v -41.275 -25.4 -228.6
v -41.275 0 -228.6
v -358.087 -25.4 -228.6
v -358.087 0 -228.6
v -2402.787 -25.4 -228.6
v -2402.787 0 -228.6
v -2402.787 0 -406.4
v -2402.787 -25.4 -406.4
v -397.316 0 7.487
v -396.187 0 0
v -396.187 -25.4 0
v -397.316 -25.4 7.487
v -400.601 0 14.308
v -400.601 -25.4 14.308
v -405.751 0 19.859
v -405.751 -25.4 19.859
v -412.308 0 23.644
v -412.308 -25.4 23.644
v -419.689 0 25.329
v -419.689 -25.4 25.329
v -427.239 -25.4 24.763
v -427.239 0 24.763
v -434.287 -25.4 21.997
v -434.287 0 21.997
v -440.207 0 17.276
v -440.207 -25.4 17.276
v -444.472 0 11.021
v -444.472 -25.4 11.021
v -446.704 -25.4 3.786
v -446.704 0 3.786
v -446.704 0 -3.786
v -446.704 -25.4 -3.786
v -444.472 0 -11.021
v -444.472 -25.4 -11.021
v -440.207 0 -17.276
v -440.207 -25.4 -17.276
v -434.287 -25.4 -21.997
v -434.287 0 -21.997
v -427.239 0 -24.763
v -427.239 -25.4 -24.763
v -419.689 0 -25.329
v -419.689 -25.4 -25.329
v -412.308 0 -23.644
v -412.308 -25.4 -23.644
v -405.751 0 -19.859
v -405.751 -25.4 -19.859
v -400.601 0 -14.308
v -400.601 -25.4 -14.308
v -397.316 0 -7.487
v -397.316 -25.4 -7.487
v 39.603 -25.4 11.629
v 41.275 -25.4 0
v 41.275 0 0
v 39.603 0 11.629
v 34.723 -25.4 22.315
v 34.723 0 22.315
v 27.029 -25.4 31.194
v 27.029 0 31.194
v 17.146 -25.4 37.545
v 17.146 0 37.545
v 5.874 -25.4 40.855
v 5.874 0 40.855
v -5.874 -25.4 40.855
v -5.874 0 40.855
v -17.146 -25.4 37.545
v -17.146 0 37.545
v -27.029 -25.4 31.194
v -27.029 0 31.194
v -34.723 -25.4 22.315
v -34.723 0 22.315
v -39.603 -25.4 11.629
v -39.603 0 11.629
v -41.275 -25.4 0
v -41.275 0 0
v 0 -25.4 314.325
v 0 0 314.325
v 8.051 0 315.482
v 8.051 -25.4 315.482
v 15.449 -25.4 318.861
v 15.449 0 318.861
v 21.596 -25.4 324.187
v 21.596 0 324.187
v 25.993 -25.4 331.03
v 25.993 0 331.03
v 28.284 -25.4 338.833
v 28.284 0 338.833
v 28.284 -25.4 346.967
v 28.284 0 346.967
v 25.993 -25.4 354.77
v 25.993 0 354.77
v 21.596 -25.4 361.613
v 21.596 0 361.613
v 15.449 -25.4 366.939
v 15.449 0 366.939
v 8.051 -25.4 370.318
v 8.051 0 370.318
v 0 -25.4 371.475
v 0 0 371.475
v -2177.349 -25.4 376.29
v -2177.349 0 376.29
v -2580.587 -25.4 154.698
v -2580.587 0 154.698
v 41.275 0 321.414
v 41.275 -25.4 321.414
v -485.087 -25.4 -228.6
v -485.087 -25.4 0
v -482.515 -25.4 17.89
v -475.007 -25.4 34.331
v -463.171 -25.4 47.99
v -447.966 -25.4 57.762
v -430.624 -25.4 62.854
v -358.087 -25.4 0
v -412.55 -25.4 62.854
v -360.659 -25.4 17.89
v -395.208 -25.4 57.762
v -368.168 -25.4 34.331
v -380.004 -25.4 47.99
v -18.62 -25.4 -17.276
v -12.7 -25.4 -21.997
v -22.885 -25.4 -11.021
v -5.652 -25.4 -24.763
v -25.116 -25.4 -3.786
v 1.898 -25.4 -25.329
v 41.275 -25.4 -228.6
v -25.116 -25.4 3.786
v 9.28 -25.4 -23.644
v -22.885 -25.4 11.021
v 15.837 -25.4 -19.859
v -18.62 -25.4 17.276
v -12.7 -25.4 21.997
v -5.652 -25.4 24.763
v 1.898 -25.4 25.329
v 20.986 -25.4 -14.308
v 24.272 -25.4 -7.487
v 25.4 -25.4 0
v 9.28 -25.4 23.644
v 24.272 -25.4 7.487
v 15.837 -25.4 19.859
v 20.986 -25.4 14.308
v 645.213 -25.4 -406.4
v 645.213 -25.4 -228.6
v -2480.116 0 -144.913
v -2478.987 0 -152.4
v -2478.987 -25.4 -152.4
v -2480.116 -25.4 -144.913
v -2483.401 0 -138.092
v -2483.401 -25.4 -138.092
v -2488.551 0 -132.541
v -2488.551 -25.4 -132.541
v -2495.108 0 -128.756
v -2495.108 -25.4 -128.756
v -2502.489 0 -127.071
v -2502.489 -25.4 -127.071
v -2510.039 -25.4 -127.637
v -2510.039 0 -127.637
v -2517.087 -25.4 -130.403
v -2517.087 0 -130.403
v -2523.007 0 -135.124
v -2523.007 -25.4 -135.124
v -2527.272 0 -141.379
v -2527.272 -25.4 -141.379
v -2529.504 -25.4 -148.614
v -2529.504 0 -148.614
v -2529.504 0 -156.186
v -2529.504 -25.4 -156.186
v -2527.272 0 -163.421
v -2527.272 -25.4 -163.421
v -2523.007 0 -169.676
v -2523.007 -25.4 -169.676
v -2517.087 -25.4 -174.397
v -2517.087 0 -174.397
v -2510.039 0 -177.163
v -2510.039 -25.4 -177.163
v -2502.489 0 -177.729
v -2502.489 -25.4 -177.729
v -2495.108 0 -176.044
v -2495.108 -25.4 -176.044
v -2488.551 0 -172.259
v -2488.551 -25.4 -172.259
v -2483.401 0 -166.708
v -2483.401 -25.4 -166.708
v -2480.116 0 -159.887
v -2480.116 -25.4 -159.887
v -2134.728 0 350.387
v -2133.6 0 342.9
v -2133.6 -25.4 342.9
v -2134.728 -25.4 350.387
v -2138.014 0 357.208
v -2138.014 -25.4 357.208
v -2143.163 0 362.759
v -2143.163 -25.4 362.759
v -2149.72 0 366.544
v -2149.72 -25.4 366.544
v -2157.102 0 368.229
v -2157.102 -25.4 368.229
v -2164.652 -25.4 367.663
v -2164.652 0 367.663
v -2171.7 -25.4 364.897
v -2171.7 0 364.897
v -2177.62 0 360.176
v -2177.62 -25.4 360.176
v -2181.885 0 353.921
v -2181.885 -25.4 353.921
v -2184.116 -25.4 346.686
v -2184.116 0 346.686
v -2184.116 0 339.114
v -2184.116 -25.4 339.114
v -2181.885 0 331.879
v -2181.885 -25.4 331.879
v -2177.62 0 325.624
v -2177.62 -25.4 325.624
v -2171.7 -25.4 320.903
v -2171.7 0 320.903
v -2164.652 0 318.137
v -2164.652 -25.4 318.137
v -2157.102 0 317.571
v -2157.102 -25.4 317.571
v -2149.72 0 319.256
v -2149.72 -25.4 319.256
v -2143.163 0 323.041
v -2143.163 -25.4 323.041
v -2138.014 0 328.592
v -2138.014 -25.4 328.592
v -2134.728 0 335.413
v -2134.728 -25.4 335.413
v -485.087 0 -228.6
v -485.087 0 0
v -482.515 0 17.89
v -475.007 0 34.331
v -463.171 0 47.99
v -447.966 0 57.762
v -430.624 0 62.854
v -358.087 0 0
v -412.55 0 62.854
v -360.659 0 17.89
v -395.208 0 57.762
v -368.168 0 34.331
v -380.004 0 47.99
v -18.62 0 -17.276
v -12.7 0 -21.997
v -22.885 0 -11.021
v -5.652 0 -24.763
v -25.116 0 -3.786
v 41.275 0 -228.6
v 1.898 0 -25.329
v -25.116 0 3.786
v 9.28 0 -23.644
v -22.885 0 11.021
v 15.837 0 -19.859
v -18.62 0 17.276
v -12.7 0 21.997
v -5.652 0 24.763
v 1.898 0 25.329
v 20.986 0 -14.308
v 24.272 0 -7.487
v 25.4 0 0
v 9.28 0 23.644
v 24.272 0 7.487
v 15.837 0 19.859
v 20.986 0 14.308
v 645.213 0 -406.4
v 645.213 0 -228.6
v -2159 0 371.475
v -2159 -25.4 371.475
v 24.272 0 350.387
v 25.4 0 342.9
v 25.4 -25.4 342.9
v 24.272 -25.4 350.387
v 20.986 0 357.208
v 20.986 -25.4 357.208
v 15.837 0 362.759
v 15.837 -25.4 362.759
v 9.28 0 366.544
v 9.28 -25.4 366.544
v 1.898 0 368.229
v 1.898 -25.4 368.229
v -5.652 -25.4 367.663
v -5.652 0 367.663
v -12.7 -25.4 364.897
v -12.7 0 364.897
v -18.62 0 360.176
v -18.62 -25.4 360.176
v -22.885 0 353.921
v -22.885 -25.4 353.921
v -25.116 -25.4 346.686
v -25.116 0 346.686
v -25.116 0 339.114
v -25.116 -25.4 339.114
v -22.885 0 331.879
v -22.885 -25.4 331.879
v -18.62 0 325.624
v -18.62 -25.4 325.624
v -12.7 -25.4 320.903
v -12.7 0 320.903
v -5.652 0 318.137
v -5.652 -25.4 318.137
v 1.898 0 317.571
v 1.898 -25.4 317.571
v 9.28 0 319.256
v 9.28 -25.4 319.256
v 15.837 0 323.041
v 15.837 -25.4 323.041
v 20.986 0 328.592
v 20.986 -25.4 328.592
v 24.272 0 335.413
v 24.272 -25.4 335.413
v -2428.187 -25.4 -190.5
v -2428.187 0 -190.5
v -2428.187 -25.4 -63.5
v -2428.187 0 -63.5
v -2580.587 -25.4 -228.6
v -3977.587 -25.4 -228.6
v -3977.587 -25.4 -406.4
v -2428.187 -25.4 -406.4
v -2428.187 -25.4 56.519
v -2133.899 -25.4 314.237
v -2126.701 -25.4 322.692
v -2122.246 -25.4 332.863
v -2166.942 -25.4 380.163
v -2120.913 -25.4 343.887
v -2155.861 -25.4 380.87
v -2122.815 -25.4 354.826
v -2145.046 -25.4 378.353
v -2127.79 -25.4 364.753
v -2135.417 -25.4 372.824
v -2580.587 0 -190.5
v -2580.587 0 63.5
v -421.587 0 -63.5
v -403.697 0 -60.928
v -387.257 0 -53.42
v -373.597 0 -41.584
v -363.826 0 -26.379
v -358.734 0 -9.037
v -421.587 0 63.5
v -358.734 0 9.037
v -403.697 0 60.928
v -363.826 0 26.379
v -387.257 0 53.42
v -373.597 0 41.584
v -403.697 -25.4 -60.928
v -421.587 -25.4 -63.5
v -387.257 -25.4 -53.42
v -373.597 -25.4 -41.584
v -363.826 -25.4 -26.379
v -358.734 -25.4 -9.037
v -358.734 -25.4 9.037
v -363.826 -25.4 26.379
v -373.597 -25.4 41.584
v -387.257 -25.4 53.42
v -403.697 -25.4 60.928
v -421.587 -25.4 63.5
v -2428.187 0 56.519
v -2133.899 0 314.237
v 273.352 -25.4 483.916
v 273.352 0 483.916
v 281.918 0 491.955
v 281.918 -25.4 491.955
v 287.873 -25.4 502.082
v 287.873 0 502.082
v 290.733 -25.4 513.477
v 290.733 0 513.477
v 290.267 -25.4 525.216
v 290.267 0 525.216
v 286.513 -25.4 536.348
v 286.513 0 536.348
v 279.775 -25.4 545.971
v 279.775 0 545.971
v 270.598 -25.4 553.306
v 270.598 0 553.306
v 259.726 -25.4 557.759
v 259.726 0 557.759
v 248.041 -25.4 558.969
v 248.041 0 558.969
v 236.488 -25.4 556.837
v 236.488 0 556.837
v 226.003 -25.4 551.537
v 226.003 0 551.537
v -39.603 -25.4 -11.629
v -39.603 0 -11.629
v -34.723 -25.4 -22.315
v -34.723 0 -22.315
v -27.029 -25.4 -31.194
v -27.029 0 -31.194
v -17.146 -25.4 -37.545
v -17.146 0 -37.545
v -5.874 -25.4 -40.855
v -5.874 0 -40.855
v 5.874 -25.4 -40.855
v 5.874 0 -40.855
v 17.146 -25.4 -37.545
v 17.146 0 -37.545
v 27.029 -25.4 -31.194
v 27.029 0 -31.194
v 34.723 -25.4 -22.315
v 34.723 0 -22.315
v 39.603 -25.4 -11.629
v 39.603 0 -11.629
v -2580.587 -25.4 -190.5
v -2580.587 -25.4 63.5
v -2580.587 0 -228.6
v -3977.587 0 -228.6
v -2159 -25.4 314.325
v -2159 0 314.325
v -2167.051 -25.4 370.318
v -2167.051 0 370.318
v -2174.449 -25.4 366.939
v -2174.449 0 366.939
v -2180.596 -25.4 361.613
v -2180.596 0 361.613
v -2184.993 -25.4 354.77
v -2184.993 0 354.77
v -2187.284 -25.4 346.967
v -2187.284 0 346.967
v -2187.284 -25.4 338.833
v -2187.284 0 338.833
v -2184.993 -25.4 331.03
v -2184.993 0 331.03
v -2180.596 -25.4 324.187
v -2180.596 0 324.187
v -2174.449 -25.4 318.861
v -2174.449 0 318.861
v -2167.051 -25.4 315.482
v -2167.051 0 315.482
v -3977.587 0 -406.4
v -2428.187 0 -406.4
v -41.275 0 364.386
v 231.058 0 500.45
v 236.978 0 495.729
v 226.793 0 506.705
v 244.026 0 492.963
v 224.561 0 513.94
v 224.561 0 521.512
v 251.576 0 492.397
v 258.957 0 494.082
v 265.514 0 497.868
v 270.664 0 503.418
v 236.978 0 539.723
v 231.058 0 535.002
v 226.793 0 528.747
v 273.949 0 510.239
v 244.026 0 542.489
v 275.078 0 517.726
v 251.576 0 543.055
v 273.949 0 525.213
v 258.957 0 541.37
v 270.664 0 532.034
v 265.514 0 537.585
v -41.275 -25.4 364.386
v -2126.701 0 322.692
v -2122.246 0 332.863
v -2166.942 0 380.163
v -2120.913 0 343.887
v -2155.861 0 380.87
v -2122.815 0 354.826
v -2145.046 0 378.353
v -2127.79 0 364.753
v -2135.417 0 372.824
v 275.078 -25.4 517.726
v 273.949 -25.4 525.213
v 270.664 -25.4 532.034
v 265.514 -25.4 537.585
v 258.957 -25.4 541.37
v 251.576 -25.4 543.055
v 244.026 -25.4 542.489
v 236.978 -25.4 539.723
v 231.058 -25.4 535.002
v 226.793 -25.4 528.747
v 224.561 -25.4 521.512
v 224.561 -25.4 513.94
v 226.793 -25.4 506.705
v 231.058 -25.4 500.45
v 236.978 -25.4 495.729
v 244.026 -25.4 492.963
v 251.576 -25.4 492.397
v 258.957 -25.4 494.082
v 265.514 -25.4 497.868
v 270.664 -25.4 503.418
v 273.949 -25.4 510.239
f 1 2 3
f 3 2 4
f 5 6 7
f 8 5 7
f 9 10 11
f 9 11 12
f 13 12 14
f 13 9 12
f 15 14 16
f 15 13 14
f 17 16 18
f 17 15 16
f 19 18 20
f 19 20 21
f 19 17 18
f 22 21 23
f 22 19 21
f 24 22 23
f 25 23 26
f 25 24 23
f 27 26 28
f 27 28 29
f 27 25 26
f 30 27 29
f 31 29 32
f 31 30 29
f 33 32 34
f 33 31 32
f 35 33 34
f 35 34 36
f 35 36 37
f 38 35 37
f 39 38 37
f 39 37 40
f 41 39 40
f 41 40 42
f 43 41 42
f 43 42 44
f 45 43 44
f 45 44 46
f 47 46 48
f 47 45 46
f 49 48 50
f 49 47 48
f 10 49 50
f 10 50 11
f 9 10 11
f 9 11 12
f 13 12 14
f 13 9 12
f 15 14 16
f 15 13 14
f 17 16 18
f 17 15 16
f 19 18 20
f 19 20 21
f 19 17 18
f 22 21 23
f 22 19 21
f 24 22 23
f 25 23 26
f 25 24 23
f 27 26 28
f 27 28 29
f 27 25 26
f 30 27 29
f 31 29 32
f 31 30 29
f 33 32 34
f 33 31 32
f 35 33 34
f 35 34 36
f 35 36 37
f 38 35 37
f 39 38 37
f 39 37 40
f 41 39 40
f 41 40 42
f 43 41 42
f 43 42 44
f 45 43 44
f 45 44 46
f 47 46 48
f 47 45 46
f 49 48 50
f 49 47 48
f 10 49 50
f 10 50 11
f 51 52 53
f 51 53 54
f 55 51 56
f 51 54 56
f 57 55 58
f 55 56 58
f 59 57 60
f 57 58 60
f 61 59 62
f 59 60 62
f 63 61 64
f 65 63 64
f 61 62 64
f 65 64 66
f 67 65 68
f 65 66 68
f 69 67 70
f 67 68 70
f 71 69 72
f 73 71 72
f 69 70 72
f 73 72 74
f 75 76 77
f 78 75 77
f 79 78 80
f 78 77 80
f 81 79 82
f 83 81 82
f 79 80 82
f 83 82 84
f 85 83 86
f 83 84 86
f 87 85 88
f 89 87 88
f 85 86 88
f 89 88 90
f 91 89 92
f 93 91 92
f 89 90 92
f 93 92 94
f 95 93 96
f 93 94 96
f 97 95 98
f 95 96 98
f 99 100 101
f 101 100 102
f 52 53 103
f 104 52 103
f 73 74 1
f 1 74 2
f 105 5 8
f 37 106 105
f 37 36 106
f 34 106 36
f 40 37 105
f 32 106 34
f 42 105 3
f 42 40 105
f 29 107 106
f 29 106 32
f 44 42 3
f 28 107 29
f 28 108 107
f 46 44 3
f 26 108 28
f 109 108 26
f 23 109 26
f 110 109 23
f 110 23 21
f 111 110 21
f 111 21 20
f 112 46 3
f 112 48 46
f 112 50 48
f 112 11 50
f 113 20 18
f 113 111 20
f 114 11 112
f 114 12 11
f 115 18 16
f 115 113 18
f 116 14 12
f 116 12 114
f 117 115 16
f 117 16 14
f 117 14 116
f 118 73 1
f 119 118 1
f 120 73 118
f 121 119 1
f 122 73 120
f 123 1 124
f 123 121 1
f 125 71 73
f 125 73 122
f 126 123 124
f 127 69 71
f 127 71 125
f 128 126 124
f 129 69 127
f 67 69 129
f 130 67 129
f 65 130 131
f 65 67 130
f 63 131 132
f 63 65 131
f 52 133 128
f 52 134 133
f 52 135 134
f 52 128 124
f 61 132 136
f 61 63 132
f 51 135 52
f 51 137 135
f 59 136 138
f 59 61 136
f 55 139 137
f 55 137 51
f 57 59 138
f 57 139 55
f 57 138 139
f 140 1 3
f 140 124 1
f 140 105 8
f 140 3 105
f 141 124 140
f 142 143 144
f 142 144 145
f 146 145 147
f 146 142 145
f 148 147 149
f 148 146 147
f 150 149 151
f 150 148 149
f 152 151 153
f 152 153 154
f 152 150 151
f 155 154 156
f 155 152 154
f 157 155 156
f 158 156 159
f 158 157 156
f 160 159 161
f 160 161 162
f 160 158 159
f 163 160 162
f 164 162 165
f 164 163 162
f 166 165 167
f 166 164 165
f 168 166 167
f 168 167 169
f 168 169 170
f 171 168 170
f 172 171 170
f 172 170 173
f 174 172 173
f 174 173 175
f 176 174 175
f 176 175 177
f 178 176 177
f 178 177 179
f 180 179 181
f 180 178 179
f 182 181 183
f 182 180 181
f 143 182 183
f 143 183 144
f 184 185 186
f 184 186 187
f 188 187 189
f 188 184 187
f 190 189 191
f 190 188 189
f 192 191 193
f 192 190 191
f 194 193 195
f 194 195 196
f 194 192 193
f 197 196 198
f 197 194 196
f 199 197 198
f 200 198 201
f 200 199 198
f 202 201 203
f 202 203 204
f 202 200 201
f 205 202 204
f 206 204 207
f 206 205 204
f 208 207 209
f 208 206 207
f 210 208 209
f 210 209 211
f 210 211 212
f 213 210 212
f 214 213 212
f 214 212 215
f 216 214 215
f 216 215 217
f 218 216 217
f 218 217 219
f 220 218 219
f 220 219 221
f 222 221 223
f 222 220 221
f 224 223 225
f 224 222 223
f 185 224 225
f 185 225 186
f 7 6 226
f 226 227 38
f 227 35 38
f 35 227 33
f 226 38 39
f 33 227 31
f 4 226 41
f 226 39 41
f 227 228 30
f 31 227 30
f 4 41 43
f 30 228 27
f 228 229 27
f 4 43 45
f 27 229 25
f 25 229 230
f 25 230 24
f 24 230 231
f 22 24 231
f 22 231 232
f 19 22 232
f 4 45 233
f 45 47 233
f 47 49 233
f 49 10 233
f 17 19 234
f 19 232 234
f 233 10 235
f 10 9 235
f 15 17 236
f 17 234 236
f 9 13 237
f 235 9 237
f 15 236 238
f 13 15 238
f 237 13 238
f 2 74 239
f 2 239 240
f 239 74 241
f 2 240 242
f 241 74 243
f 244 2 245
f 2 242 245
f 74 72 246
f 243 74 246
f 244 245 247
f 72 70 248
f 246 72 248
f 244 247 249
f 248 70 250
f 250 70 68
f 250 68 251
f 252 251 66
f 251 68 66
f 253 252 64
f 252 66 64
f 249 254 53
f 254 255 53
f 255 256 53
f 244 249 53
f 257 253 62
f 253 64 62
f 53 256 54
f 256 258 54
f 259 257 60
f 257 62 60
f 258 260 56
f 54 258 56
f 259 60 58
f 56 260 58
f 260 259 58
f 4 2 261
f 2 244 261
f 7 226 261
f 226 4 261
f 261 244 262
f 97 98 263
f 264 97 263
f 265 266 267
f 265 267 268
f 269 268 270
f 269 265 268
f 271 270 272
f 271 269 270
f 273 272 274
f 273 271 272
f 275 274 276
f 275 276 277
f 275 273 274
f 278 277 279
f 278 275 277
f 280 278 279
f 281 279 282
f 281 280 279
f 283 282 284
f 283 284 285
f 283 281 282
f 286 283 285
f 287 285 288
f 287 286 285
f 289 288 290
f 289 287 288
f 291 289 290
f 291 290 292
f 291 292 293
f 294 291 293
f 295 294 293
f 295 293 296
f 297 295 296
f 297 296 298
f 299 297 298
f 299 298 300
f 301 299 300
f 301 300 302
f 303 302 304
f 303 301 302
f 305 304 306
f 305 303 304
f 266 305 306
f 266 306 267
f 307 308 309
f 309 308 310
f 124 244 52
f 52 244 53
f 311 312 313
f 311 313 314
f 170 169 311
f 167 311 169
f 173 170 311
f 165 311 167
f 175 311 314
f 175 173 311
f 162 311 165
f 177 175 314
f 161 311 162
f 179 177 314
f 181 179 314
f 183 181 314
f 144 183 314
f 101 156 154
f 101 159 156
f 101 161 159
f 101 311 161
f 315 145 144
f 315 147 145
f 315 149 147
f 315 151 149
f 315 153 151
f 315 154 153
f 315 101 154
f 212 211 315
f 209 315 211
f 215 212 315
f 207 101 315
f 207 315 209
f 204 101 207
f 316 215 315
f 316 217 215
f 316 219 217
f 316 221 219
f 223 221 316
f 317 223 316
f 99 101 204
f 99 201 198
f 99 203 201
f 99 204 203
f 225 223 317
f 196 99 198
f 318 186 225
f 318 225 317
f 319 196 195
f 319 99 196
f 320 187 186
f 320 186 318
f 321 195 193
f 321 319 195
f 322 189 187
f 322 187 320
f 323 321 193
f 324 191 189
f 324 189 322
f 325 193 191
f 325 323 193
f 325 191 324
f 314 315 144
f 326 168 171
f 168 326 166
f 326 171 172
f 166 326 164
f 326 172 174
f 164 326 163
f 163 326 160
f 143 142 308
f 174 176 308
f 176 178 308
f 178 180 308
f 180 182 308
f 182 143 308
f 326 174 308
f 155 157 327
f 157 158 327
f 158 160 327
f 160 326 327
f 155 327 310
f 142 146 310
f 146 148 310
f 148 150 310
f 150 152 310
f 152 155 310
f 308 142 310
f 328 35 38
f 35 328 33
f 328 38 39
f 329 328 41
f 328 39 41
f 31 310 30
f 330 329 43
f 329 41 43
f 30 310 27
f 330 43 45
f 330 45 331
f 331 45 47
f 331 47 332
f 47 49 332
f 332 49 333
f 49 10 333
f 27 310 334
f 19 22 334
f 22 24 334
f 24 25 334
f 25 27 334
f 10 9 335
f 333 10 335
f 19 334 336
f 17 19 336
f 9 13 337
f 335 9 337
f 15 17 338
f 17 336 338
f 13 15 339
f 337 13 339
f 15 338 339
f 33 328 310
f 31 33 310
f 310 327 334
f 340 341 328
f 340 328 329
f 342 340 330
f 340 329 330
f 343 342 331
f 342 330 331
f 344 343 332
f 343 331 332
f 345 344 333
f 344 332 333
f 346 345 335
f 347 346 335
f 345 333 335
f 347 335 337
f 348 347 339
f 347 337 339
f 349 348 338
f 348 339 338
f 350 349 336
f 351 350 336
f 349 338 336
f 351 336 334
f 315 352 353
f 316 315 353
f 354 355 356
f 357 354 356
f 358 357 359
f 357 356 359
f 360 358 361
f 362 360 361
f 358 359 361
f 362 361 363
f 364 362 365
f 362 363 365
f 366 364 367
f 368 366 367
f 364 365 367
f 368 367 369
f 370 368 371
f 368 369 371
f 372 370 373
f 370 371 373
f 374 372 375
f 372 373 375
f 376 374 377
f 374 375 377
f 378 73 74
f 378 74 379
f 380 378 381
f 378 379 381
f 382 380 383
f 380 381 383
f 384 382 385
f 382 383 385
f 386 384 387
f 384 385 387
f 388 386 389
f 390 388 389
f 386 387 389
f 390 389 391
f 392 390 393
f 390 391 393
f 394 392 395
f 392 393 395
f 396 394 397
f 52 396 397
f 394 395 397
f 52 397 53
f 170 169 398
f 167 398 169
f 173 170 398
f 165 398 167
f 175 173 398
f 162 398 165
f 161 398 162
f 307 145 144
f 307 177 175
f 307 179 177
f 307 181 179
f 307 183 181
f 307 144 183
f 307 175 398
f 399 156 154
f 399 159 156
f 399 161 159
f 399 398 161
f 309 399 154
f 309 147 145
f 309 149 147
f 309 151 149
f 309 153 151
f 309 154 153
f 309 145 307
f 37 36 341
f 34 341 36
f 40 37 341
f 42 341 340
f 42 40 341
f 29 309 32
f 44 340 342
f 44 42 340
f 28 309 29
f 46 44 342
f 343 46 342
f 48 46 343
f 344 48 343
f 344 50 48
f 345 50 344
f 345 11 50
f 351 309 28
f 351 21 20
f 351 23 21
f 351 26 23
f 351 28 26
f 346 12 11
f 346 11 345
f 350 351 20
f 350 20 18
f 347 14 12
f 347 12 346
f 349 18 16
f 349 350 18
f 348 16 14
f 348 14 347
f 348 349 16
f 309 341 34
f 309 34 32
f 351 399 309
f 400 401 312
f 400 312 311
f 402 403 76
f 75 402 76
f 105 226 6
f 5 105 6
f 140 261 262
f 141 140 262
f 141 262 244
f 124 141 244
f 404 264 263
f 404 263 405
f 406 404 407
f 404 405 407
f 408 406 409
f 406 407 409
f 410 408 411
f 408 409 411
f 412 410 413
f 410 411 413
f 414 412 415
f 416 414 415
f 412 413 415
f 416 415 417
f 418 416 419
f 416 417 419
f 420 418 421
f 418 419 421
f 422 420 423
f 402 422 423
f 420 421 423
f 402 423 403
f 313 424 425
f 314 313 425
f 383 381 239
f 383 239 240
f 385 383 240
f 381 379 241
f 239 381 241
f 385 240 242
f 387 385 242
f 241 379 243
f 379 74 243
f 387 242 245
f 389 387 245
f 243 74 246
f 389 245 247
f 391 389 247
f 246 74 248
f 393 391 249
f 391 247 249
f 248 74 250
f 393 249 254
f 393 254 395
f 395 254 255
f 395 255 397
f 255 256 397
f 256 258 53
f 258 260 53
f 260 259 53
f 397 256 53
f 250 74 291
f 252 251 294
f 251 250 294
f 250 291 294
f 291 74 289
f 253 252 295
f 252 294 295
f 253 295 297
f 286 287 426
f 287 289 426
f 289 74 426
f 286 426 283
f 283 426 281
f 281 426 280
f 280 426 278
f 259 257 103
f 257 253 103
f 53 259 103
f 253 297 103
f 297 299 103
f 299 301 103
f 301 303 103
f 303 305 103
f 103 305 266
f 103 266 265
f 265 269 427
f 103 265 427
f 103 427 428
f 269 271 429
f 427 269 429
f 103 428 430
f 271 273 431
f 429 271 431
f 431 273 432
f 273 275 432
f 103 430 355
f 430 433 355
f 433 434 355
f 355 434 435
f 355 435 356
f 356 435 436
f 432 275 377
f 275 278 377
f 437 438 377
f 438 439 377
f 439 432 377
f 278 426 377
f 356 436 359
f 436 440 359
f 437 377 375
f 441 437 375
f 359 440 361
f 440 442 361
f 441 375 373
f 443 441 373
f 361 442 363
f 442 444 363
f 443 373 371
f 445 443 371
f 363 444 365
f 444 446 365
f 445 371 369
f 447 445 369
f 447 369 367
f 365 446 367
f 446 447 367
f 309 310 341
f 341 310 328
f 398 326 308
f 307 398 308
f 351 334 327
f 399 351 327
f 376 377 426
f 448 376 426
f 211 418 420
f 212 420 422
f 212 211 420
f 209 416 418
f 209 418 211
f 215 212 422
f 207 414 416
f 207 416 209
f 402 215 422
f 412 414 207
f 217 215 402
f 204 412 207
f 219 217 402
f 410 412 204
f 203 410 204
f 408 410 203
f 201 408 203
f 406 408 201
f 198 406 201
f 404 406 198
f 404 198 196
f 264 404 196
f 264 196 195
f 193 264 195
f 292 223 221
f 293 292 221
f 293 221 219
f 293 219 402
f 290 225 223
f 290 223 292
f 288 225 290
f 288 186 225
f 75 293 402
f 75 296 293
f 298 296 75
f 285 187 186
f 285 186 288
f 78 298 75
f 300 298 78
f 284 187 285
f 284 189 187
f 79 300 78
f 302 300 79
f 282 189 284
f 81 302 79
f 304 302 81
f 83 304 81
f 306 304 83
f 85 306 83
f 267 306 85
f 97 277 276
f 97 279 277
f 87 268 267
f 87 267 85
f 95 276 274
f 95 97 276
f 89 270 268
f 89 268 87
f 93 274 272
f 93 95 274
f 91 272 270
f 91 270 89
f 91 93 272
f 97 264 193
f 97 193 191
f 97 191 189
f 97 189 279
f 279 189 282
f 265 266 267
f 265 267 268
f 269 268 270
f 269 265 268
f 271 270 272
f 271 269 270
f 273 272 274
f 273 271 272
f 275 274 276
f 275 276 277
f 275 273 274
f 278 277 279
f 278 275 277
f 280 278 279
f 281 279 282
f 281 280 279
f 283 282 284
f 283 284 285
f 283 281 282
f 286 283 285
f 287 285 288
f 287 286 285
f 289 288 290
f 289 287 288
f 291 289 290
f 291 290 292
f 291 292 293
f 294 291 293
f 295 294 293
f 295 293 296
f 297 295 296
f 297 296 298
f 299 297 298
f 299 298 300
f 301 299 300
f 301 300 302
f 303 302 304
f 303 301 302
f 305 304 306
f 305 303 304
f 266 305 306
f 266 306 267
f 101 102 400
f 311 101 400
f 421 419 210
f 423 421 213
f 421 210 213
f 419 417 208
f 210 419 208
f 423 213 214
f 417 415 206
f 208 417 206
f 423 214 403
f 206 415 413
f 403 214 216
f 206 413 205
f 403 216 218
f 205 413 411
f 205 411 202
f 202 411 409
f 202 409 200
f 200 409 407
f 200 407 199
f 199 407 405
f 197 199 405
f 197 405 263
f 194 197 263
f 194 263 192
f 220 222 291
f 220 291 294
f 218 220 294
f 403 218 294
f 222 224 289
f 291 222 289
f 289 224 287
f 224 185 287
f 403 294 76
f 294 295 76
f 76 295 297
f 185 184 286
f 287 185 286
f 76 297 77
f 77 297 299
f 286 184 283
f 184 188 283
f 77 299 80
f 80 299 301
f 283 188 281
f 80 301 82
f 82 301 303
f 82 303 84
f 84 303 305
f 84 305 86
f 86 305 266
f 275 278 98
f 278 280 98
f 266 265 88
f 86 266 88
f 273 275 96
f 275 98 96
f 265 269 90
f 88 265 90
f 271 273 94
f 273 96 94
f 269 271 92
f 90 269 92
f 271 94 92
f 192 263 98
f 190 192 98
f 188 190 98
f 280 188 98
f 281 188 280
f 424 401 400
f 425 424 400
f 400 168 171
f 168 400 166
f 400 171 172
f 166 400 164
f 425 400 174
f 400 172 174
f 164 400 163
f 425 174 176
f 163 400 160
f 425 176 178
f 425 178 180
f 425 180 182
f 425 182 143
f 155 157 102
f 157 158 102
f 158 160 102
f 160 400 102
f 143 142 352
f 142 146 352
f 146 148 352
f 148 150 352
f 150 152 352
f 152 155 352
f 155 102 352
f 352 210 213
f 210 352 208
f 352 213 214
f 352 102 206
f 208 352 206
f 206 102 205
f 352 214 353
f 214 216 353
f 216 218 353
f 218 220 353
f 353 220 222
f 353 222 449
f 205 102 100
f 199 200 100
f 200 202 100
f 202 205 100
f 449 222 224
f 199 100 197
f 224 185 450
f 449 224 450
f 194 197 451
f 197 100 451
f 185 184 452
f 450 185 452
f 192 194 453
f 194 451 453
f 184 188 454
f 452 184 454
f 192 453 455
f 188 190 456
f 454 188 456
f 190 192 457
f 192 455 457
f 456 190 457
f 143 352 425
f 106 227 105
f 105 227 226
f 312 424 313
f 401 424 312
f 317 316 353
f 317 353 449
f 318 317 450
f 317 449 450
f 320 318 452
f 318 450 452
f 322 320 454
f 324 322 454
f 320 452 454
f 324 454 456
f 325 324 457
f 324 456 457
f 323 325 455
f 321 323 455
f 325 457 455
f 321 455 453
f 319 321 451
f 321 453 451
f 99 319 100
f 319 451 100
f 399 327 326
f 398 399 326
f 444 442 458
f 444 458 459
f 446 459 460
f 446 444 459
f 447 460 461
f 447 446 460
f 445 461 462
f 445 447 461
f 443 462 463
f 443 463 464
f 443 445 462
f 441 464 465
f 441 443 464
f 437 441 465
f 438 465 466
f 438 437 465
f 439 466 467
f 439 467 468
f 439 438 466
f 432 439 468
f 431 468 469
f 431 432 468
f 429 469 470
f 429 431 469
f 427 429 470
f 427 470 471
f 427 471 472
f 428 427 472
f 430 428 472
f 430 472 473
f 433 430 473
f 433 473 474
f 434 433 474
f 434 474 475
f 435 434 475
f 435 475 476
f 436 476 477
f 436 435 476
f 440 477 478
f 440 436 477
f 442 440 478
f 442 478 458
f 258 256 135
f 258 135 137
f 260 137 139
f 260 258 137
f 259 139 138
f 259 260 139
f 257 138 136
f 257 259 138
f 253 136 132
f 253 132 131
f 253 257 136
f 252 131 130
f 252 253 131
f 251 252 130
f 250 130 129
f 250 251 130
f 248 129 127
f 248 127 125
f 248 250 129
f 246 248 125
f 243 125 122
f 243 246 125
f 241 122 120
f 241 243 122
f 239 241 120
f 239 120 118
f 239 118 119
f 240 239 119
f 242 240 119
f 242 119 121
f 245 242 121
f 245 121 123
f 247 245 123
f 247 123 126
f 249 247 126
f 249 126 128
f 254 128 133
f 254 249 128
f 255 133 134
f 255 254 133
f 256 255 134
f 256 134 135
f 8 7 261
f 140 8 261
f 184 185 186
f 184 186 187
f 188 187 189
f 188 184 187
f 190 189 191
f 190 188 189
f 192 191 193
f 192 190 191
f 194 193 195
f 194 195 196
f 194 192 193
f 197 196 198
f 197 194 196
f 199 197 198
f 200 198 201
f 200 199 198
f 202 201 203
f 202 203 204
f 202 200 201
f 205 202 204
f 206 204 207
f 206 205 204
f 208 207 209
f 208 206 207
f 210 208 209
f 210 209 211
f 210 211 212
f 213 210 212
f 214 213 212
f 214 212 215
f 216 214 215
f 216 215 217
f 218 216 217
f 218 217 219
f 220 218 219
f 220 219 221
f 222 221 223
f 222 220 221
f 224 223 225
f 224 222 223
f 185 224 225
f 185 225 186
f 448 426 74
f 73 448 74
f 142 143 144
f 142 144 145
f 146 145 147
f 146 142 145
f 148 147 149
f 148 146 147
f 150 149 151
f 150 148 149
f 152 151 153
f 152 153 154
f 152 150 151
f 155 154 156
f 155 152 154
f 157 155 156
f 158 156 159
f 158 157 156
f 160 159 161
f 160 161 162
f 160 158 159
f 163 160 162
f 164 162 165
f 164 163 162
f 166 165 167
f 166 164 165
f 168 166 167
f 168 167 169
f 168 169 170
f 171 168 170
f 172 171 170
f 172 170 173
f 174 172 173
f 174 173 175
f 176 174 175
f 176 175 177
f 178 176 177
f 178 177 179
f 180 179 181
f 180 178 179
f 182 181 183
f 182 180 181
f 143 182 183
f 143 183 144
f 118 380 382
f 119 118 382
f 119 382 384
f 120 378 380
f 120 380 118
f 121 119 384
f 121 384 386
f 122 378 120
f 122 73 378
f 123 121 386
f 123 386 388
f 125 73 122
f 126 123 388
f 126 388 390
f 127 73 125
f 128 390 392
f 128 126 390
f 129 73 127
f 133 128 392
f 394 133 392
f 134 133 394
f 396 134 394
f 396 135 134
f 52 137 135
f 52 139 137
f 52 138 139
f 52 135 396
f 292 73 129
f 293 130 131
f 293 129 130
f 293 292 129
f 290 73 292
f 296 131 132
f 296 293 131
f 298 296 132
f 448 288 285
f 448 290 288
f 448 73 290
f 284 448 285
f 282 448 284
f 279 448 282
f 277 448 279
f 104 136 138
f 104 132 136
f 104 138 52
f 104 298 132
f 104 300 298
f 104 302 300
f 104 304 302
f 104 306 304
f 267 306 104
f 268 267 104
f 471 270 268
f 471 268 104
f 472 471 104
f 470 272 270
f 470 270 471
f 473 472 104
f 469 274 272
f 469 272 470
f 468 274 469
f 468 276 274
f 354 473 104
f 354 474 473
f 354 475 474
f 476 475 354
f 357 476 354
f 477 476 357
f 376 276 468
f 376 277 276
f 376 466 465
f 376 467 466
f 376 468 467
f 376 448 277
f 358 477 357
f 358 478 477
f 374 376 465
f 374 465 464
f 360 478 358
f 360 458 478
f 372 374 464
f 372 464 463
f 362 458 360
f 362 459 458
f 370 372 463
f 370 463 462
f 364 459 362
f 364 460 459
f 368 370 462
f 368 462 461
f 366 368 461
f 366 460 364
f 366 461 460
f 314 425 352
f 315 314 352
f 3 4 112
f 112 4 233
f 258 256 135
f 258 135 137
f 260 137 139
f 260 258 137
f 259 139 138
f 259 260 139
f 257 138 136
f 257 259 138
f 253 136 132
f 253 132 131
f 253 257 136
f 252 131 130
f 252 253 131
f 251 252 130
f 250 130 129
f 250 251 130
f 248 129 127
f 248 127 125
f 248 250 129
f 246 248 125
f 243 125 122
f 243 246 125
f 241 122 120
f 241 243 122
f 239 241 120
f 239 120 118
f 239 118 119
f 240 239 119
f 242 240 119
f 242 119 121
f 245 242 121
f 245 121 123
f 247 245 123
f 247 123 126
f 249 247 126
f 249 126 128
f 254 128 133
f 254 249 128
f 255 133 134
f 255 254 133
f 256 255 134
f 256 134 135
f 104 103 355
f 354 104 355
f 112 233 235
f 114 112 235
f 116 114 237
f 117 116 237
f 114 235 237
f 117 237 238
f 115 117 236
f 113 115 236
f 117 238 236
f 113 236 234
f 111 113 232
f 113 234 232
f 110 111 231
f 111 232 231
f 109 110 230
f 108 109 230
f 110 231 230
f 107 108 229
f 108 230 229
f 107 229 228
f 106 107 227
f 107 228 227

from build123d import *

# Parameters (mm, degrees)
F1_R      = 25.4
F2_DEPTH  = 25.4
F3_R      = 25.4
F4_DEPTH  = 25.4
F5_R      = 25.4
F6_DEPTH  = 25.4
F7_R      = 25.4
F8_DEPTH  = 25.4
F9_R      = 25.4
F10_DEPTH = 25.4
F11_W     = 1397
F11_H     = 177.8
F12_DEPTH = 25.4


with BuildPart() as f2:
    # F1 (on Front) → F2 (new body)
    with BuildSketch(Plane.XZ):
        with BuildLine():
            Line((-2428.187268, 56.519093), (-2133.899062, 314.237255))
            ThreePointArc((-2133.899062, 314.237255), (-2127.790307, 364.753262), (-2177.349143, 376.290402))
            Line((-2177.349143, 376.290402), (-2580.587268, 154.697556))
            Line((-2580.587268, 154.697556), (-2580.587268, -406.4))
            Line((-2580.587268, -406.4), (-2428.187268, -406.4))
            Line((-2428.187268, -406.4), (-2428.187268, 56.519093))
        make_face()
        with Locations((-2504.387268, -152.4)):
            Circle(F1_R, mode=Mode.SUBTRACT)
        with Locations((-2159, 342.9)):
            Circle(F1_R, mode=Mode.SUBTRACT)
    extrude(amount=F2_DEPTH)

    # F11 (on Front) → F12 (join)
    with BuildSketch(Plane.XZ):
        with Locations((-3279.087268, -317.5)):
            Rectangle(F11_W, F11_H)
    extrude(amount=F12_DEPTH)


with BuildPart() as f4:
    # F3 (on Front) → F4 (new body)
    with BuildSketch(Plane.XZ):
        with BuildLine():
            Line((-2428.187268, -63.5), (-421.587268, -63.5))
            ThreePointArc((-421.587268, -63.5), (-358.087268, 0), (-421.587268, 63.5))
            Line((-421.587268, 63.5), (-2580.587268, 63.5))
            Line((-2580.587268, 63.5), (-2580.587268, -190.5))
            Line((-2580.587268, -190.5), (-2428.187268, -190.5))
            Line((-2428.187268, -190.5), (-2428.187268, -63.5))
        make_face()
        with Locations((-2504.387268, -152.4)):
            Circle(F3_R, mode=Mode.SUBTRACT)
        with Locations((-421.587268, 0)):
            Circle(F3_R, mode=Mode.SUBTRACT)
    extrude(amount=F4_DEPTH)


with BuildPart() as f6:
    # F5 (on Front) → F6 (new body)
    with BuildSketch(Plane.XZ):
        with BuildLine():
            Line((41.275, 321.413595), (273.351911, 483.915597))
            ThreePointArc((273.351911, 483.915597), (283.488044, 541.400465), (226.003176, 551.536598))
            Line((226.003176, 551.536598), (-41.275, 364.386405))
            Line((-41.275, 364.386405), (-41.275, 0))
            ThreePointArc((-41.275, 0), (0, -41.275), (41.275, 0))
            Line((41.275, 0), (41.275, 321.413595))
        make_face()
        Circle(F5_R, mode=Mode.SUBTRACT)
        with Locations((0, 342.9)):
            Circle(F5_R, mode=Mode.SUBTRACT)
        with Locations((249.677543, 517.726098)):
            Circle(F5_R, mode=Mode.SUBTRACT)
    extrude(amount=F6_DEPTH)


with BuildPart() as f8:
    # F7 (on Front) → F8 (new body)
    with BuildSketch(Plane.XZ):
        with BuildLine():
            Line((0, 371.475), (-2159, 371.475))
            ThreePointArc((-2159, 371.475), (-2187.575, 342.9), (-2159, 314.325))
            Line((-2159, 314.325), (0, 314.325))
            ThreePointArc((0, 314.325), (28.575, 342.9), (0, 371.475))
        make_face()
        with Locations((-2159, 342.9)):
            Circle(F7_R, mode=Mode.SUBTRACT)
        with Locations((0, 342.9)):
            Circle(F7_R, mode=Mode.SUBTRACT)
    extrude(amount=F8_DEPTH)


with BuildPart() as f10:
    # F9 (on Front) → F10 (new body)
    with BuildSketch(Plane.XZ):
        with BuildLine():
            Line((-485.087268, -228.6), (-2402.787268, -228.6))
            Line((-2402.787268, -228.6), (-2402.787268, -406.4))
            Line((-2402.787268, -406.4), (645.212732, -406.4))
            Line((645.212732, -406.4), (645.212732, -228.6))
            Line((645.212732, -228.6), (41.275, -228.6))
            Line((41.275, -228.6), (41.275, 0))
            ThreePointArc((41.275, 0), (0, -41.275), (-41.275, 0))
            Line((-41.275, 0), (-41.275, -228.6))
            Line((-41.275, -228.6), (-358.087268, -228.6))
            Line((-358.087268, -228.6), (-358.087268, 0))
            ThreePointArc((-358.087268, 0), (-421.587268, -63.5), (-485.087268, 0))
            Line((-485.087268, 0), (-485.087268, -228.6))
        make_face()
        with BuildLine():
            ThreePointArc((-358.087268, 0), (-421.587268, 63.5), (-485.087268, 0))
            ThreePointArc((-485.087268, 0), (-421.587268, -63.5), (-358.087268, 0))
        make_face()
        with Locations((-421.587268, 0)):
            Circle(F9_R, mode=Mode.SUBTRACT)
        with BuildLine():
            ThreePointArc((-41.275, 0), (0, -41.275), (41.275, 0))
            ThreePointArc((41.275, 0), (0, 41.275), (-41.275, 0))
        make_face()
        Circle(F9_R, mode=Mode.SUBTRACT)
    extrude(amount=F10_DEPTH)


solid = Compound([f2.part, f4.part, f6.part, f8.part, f10.part])
